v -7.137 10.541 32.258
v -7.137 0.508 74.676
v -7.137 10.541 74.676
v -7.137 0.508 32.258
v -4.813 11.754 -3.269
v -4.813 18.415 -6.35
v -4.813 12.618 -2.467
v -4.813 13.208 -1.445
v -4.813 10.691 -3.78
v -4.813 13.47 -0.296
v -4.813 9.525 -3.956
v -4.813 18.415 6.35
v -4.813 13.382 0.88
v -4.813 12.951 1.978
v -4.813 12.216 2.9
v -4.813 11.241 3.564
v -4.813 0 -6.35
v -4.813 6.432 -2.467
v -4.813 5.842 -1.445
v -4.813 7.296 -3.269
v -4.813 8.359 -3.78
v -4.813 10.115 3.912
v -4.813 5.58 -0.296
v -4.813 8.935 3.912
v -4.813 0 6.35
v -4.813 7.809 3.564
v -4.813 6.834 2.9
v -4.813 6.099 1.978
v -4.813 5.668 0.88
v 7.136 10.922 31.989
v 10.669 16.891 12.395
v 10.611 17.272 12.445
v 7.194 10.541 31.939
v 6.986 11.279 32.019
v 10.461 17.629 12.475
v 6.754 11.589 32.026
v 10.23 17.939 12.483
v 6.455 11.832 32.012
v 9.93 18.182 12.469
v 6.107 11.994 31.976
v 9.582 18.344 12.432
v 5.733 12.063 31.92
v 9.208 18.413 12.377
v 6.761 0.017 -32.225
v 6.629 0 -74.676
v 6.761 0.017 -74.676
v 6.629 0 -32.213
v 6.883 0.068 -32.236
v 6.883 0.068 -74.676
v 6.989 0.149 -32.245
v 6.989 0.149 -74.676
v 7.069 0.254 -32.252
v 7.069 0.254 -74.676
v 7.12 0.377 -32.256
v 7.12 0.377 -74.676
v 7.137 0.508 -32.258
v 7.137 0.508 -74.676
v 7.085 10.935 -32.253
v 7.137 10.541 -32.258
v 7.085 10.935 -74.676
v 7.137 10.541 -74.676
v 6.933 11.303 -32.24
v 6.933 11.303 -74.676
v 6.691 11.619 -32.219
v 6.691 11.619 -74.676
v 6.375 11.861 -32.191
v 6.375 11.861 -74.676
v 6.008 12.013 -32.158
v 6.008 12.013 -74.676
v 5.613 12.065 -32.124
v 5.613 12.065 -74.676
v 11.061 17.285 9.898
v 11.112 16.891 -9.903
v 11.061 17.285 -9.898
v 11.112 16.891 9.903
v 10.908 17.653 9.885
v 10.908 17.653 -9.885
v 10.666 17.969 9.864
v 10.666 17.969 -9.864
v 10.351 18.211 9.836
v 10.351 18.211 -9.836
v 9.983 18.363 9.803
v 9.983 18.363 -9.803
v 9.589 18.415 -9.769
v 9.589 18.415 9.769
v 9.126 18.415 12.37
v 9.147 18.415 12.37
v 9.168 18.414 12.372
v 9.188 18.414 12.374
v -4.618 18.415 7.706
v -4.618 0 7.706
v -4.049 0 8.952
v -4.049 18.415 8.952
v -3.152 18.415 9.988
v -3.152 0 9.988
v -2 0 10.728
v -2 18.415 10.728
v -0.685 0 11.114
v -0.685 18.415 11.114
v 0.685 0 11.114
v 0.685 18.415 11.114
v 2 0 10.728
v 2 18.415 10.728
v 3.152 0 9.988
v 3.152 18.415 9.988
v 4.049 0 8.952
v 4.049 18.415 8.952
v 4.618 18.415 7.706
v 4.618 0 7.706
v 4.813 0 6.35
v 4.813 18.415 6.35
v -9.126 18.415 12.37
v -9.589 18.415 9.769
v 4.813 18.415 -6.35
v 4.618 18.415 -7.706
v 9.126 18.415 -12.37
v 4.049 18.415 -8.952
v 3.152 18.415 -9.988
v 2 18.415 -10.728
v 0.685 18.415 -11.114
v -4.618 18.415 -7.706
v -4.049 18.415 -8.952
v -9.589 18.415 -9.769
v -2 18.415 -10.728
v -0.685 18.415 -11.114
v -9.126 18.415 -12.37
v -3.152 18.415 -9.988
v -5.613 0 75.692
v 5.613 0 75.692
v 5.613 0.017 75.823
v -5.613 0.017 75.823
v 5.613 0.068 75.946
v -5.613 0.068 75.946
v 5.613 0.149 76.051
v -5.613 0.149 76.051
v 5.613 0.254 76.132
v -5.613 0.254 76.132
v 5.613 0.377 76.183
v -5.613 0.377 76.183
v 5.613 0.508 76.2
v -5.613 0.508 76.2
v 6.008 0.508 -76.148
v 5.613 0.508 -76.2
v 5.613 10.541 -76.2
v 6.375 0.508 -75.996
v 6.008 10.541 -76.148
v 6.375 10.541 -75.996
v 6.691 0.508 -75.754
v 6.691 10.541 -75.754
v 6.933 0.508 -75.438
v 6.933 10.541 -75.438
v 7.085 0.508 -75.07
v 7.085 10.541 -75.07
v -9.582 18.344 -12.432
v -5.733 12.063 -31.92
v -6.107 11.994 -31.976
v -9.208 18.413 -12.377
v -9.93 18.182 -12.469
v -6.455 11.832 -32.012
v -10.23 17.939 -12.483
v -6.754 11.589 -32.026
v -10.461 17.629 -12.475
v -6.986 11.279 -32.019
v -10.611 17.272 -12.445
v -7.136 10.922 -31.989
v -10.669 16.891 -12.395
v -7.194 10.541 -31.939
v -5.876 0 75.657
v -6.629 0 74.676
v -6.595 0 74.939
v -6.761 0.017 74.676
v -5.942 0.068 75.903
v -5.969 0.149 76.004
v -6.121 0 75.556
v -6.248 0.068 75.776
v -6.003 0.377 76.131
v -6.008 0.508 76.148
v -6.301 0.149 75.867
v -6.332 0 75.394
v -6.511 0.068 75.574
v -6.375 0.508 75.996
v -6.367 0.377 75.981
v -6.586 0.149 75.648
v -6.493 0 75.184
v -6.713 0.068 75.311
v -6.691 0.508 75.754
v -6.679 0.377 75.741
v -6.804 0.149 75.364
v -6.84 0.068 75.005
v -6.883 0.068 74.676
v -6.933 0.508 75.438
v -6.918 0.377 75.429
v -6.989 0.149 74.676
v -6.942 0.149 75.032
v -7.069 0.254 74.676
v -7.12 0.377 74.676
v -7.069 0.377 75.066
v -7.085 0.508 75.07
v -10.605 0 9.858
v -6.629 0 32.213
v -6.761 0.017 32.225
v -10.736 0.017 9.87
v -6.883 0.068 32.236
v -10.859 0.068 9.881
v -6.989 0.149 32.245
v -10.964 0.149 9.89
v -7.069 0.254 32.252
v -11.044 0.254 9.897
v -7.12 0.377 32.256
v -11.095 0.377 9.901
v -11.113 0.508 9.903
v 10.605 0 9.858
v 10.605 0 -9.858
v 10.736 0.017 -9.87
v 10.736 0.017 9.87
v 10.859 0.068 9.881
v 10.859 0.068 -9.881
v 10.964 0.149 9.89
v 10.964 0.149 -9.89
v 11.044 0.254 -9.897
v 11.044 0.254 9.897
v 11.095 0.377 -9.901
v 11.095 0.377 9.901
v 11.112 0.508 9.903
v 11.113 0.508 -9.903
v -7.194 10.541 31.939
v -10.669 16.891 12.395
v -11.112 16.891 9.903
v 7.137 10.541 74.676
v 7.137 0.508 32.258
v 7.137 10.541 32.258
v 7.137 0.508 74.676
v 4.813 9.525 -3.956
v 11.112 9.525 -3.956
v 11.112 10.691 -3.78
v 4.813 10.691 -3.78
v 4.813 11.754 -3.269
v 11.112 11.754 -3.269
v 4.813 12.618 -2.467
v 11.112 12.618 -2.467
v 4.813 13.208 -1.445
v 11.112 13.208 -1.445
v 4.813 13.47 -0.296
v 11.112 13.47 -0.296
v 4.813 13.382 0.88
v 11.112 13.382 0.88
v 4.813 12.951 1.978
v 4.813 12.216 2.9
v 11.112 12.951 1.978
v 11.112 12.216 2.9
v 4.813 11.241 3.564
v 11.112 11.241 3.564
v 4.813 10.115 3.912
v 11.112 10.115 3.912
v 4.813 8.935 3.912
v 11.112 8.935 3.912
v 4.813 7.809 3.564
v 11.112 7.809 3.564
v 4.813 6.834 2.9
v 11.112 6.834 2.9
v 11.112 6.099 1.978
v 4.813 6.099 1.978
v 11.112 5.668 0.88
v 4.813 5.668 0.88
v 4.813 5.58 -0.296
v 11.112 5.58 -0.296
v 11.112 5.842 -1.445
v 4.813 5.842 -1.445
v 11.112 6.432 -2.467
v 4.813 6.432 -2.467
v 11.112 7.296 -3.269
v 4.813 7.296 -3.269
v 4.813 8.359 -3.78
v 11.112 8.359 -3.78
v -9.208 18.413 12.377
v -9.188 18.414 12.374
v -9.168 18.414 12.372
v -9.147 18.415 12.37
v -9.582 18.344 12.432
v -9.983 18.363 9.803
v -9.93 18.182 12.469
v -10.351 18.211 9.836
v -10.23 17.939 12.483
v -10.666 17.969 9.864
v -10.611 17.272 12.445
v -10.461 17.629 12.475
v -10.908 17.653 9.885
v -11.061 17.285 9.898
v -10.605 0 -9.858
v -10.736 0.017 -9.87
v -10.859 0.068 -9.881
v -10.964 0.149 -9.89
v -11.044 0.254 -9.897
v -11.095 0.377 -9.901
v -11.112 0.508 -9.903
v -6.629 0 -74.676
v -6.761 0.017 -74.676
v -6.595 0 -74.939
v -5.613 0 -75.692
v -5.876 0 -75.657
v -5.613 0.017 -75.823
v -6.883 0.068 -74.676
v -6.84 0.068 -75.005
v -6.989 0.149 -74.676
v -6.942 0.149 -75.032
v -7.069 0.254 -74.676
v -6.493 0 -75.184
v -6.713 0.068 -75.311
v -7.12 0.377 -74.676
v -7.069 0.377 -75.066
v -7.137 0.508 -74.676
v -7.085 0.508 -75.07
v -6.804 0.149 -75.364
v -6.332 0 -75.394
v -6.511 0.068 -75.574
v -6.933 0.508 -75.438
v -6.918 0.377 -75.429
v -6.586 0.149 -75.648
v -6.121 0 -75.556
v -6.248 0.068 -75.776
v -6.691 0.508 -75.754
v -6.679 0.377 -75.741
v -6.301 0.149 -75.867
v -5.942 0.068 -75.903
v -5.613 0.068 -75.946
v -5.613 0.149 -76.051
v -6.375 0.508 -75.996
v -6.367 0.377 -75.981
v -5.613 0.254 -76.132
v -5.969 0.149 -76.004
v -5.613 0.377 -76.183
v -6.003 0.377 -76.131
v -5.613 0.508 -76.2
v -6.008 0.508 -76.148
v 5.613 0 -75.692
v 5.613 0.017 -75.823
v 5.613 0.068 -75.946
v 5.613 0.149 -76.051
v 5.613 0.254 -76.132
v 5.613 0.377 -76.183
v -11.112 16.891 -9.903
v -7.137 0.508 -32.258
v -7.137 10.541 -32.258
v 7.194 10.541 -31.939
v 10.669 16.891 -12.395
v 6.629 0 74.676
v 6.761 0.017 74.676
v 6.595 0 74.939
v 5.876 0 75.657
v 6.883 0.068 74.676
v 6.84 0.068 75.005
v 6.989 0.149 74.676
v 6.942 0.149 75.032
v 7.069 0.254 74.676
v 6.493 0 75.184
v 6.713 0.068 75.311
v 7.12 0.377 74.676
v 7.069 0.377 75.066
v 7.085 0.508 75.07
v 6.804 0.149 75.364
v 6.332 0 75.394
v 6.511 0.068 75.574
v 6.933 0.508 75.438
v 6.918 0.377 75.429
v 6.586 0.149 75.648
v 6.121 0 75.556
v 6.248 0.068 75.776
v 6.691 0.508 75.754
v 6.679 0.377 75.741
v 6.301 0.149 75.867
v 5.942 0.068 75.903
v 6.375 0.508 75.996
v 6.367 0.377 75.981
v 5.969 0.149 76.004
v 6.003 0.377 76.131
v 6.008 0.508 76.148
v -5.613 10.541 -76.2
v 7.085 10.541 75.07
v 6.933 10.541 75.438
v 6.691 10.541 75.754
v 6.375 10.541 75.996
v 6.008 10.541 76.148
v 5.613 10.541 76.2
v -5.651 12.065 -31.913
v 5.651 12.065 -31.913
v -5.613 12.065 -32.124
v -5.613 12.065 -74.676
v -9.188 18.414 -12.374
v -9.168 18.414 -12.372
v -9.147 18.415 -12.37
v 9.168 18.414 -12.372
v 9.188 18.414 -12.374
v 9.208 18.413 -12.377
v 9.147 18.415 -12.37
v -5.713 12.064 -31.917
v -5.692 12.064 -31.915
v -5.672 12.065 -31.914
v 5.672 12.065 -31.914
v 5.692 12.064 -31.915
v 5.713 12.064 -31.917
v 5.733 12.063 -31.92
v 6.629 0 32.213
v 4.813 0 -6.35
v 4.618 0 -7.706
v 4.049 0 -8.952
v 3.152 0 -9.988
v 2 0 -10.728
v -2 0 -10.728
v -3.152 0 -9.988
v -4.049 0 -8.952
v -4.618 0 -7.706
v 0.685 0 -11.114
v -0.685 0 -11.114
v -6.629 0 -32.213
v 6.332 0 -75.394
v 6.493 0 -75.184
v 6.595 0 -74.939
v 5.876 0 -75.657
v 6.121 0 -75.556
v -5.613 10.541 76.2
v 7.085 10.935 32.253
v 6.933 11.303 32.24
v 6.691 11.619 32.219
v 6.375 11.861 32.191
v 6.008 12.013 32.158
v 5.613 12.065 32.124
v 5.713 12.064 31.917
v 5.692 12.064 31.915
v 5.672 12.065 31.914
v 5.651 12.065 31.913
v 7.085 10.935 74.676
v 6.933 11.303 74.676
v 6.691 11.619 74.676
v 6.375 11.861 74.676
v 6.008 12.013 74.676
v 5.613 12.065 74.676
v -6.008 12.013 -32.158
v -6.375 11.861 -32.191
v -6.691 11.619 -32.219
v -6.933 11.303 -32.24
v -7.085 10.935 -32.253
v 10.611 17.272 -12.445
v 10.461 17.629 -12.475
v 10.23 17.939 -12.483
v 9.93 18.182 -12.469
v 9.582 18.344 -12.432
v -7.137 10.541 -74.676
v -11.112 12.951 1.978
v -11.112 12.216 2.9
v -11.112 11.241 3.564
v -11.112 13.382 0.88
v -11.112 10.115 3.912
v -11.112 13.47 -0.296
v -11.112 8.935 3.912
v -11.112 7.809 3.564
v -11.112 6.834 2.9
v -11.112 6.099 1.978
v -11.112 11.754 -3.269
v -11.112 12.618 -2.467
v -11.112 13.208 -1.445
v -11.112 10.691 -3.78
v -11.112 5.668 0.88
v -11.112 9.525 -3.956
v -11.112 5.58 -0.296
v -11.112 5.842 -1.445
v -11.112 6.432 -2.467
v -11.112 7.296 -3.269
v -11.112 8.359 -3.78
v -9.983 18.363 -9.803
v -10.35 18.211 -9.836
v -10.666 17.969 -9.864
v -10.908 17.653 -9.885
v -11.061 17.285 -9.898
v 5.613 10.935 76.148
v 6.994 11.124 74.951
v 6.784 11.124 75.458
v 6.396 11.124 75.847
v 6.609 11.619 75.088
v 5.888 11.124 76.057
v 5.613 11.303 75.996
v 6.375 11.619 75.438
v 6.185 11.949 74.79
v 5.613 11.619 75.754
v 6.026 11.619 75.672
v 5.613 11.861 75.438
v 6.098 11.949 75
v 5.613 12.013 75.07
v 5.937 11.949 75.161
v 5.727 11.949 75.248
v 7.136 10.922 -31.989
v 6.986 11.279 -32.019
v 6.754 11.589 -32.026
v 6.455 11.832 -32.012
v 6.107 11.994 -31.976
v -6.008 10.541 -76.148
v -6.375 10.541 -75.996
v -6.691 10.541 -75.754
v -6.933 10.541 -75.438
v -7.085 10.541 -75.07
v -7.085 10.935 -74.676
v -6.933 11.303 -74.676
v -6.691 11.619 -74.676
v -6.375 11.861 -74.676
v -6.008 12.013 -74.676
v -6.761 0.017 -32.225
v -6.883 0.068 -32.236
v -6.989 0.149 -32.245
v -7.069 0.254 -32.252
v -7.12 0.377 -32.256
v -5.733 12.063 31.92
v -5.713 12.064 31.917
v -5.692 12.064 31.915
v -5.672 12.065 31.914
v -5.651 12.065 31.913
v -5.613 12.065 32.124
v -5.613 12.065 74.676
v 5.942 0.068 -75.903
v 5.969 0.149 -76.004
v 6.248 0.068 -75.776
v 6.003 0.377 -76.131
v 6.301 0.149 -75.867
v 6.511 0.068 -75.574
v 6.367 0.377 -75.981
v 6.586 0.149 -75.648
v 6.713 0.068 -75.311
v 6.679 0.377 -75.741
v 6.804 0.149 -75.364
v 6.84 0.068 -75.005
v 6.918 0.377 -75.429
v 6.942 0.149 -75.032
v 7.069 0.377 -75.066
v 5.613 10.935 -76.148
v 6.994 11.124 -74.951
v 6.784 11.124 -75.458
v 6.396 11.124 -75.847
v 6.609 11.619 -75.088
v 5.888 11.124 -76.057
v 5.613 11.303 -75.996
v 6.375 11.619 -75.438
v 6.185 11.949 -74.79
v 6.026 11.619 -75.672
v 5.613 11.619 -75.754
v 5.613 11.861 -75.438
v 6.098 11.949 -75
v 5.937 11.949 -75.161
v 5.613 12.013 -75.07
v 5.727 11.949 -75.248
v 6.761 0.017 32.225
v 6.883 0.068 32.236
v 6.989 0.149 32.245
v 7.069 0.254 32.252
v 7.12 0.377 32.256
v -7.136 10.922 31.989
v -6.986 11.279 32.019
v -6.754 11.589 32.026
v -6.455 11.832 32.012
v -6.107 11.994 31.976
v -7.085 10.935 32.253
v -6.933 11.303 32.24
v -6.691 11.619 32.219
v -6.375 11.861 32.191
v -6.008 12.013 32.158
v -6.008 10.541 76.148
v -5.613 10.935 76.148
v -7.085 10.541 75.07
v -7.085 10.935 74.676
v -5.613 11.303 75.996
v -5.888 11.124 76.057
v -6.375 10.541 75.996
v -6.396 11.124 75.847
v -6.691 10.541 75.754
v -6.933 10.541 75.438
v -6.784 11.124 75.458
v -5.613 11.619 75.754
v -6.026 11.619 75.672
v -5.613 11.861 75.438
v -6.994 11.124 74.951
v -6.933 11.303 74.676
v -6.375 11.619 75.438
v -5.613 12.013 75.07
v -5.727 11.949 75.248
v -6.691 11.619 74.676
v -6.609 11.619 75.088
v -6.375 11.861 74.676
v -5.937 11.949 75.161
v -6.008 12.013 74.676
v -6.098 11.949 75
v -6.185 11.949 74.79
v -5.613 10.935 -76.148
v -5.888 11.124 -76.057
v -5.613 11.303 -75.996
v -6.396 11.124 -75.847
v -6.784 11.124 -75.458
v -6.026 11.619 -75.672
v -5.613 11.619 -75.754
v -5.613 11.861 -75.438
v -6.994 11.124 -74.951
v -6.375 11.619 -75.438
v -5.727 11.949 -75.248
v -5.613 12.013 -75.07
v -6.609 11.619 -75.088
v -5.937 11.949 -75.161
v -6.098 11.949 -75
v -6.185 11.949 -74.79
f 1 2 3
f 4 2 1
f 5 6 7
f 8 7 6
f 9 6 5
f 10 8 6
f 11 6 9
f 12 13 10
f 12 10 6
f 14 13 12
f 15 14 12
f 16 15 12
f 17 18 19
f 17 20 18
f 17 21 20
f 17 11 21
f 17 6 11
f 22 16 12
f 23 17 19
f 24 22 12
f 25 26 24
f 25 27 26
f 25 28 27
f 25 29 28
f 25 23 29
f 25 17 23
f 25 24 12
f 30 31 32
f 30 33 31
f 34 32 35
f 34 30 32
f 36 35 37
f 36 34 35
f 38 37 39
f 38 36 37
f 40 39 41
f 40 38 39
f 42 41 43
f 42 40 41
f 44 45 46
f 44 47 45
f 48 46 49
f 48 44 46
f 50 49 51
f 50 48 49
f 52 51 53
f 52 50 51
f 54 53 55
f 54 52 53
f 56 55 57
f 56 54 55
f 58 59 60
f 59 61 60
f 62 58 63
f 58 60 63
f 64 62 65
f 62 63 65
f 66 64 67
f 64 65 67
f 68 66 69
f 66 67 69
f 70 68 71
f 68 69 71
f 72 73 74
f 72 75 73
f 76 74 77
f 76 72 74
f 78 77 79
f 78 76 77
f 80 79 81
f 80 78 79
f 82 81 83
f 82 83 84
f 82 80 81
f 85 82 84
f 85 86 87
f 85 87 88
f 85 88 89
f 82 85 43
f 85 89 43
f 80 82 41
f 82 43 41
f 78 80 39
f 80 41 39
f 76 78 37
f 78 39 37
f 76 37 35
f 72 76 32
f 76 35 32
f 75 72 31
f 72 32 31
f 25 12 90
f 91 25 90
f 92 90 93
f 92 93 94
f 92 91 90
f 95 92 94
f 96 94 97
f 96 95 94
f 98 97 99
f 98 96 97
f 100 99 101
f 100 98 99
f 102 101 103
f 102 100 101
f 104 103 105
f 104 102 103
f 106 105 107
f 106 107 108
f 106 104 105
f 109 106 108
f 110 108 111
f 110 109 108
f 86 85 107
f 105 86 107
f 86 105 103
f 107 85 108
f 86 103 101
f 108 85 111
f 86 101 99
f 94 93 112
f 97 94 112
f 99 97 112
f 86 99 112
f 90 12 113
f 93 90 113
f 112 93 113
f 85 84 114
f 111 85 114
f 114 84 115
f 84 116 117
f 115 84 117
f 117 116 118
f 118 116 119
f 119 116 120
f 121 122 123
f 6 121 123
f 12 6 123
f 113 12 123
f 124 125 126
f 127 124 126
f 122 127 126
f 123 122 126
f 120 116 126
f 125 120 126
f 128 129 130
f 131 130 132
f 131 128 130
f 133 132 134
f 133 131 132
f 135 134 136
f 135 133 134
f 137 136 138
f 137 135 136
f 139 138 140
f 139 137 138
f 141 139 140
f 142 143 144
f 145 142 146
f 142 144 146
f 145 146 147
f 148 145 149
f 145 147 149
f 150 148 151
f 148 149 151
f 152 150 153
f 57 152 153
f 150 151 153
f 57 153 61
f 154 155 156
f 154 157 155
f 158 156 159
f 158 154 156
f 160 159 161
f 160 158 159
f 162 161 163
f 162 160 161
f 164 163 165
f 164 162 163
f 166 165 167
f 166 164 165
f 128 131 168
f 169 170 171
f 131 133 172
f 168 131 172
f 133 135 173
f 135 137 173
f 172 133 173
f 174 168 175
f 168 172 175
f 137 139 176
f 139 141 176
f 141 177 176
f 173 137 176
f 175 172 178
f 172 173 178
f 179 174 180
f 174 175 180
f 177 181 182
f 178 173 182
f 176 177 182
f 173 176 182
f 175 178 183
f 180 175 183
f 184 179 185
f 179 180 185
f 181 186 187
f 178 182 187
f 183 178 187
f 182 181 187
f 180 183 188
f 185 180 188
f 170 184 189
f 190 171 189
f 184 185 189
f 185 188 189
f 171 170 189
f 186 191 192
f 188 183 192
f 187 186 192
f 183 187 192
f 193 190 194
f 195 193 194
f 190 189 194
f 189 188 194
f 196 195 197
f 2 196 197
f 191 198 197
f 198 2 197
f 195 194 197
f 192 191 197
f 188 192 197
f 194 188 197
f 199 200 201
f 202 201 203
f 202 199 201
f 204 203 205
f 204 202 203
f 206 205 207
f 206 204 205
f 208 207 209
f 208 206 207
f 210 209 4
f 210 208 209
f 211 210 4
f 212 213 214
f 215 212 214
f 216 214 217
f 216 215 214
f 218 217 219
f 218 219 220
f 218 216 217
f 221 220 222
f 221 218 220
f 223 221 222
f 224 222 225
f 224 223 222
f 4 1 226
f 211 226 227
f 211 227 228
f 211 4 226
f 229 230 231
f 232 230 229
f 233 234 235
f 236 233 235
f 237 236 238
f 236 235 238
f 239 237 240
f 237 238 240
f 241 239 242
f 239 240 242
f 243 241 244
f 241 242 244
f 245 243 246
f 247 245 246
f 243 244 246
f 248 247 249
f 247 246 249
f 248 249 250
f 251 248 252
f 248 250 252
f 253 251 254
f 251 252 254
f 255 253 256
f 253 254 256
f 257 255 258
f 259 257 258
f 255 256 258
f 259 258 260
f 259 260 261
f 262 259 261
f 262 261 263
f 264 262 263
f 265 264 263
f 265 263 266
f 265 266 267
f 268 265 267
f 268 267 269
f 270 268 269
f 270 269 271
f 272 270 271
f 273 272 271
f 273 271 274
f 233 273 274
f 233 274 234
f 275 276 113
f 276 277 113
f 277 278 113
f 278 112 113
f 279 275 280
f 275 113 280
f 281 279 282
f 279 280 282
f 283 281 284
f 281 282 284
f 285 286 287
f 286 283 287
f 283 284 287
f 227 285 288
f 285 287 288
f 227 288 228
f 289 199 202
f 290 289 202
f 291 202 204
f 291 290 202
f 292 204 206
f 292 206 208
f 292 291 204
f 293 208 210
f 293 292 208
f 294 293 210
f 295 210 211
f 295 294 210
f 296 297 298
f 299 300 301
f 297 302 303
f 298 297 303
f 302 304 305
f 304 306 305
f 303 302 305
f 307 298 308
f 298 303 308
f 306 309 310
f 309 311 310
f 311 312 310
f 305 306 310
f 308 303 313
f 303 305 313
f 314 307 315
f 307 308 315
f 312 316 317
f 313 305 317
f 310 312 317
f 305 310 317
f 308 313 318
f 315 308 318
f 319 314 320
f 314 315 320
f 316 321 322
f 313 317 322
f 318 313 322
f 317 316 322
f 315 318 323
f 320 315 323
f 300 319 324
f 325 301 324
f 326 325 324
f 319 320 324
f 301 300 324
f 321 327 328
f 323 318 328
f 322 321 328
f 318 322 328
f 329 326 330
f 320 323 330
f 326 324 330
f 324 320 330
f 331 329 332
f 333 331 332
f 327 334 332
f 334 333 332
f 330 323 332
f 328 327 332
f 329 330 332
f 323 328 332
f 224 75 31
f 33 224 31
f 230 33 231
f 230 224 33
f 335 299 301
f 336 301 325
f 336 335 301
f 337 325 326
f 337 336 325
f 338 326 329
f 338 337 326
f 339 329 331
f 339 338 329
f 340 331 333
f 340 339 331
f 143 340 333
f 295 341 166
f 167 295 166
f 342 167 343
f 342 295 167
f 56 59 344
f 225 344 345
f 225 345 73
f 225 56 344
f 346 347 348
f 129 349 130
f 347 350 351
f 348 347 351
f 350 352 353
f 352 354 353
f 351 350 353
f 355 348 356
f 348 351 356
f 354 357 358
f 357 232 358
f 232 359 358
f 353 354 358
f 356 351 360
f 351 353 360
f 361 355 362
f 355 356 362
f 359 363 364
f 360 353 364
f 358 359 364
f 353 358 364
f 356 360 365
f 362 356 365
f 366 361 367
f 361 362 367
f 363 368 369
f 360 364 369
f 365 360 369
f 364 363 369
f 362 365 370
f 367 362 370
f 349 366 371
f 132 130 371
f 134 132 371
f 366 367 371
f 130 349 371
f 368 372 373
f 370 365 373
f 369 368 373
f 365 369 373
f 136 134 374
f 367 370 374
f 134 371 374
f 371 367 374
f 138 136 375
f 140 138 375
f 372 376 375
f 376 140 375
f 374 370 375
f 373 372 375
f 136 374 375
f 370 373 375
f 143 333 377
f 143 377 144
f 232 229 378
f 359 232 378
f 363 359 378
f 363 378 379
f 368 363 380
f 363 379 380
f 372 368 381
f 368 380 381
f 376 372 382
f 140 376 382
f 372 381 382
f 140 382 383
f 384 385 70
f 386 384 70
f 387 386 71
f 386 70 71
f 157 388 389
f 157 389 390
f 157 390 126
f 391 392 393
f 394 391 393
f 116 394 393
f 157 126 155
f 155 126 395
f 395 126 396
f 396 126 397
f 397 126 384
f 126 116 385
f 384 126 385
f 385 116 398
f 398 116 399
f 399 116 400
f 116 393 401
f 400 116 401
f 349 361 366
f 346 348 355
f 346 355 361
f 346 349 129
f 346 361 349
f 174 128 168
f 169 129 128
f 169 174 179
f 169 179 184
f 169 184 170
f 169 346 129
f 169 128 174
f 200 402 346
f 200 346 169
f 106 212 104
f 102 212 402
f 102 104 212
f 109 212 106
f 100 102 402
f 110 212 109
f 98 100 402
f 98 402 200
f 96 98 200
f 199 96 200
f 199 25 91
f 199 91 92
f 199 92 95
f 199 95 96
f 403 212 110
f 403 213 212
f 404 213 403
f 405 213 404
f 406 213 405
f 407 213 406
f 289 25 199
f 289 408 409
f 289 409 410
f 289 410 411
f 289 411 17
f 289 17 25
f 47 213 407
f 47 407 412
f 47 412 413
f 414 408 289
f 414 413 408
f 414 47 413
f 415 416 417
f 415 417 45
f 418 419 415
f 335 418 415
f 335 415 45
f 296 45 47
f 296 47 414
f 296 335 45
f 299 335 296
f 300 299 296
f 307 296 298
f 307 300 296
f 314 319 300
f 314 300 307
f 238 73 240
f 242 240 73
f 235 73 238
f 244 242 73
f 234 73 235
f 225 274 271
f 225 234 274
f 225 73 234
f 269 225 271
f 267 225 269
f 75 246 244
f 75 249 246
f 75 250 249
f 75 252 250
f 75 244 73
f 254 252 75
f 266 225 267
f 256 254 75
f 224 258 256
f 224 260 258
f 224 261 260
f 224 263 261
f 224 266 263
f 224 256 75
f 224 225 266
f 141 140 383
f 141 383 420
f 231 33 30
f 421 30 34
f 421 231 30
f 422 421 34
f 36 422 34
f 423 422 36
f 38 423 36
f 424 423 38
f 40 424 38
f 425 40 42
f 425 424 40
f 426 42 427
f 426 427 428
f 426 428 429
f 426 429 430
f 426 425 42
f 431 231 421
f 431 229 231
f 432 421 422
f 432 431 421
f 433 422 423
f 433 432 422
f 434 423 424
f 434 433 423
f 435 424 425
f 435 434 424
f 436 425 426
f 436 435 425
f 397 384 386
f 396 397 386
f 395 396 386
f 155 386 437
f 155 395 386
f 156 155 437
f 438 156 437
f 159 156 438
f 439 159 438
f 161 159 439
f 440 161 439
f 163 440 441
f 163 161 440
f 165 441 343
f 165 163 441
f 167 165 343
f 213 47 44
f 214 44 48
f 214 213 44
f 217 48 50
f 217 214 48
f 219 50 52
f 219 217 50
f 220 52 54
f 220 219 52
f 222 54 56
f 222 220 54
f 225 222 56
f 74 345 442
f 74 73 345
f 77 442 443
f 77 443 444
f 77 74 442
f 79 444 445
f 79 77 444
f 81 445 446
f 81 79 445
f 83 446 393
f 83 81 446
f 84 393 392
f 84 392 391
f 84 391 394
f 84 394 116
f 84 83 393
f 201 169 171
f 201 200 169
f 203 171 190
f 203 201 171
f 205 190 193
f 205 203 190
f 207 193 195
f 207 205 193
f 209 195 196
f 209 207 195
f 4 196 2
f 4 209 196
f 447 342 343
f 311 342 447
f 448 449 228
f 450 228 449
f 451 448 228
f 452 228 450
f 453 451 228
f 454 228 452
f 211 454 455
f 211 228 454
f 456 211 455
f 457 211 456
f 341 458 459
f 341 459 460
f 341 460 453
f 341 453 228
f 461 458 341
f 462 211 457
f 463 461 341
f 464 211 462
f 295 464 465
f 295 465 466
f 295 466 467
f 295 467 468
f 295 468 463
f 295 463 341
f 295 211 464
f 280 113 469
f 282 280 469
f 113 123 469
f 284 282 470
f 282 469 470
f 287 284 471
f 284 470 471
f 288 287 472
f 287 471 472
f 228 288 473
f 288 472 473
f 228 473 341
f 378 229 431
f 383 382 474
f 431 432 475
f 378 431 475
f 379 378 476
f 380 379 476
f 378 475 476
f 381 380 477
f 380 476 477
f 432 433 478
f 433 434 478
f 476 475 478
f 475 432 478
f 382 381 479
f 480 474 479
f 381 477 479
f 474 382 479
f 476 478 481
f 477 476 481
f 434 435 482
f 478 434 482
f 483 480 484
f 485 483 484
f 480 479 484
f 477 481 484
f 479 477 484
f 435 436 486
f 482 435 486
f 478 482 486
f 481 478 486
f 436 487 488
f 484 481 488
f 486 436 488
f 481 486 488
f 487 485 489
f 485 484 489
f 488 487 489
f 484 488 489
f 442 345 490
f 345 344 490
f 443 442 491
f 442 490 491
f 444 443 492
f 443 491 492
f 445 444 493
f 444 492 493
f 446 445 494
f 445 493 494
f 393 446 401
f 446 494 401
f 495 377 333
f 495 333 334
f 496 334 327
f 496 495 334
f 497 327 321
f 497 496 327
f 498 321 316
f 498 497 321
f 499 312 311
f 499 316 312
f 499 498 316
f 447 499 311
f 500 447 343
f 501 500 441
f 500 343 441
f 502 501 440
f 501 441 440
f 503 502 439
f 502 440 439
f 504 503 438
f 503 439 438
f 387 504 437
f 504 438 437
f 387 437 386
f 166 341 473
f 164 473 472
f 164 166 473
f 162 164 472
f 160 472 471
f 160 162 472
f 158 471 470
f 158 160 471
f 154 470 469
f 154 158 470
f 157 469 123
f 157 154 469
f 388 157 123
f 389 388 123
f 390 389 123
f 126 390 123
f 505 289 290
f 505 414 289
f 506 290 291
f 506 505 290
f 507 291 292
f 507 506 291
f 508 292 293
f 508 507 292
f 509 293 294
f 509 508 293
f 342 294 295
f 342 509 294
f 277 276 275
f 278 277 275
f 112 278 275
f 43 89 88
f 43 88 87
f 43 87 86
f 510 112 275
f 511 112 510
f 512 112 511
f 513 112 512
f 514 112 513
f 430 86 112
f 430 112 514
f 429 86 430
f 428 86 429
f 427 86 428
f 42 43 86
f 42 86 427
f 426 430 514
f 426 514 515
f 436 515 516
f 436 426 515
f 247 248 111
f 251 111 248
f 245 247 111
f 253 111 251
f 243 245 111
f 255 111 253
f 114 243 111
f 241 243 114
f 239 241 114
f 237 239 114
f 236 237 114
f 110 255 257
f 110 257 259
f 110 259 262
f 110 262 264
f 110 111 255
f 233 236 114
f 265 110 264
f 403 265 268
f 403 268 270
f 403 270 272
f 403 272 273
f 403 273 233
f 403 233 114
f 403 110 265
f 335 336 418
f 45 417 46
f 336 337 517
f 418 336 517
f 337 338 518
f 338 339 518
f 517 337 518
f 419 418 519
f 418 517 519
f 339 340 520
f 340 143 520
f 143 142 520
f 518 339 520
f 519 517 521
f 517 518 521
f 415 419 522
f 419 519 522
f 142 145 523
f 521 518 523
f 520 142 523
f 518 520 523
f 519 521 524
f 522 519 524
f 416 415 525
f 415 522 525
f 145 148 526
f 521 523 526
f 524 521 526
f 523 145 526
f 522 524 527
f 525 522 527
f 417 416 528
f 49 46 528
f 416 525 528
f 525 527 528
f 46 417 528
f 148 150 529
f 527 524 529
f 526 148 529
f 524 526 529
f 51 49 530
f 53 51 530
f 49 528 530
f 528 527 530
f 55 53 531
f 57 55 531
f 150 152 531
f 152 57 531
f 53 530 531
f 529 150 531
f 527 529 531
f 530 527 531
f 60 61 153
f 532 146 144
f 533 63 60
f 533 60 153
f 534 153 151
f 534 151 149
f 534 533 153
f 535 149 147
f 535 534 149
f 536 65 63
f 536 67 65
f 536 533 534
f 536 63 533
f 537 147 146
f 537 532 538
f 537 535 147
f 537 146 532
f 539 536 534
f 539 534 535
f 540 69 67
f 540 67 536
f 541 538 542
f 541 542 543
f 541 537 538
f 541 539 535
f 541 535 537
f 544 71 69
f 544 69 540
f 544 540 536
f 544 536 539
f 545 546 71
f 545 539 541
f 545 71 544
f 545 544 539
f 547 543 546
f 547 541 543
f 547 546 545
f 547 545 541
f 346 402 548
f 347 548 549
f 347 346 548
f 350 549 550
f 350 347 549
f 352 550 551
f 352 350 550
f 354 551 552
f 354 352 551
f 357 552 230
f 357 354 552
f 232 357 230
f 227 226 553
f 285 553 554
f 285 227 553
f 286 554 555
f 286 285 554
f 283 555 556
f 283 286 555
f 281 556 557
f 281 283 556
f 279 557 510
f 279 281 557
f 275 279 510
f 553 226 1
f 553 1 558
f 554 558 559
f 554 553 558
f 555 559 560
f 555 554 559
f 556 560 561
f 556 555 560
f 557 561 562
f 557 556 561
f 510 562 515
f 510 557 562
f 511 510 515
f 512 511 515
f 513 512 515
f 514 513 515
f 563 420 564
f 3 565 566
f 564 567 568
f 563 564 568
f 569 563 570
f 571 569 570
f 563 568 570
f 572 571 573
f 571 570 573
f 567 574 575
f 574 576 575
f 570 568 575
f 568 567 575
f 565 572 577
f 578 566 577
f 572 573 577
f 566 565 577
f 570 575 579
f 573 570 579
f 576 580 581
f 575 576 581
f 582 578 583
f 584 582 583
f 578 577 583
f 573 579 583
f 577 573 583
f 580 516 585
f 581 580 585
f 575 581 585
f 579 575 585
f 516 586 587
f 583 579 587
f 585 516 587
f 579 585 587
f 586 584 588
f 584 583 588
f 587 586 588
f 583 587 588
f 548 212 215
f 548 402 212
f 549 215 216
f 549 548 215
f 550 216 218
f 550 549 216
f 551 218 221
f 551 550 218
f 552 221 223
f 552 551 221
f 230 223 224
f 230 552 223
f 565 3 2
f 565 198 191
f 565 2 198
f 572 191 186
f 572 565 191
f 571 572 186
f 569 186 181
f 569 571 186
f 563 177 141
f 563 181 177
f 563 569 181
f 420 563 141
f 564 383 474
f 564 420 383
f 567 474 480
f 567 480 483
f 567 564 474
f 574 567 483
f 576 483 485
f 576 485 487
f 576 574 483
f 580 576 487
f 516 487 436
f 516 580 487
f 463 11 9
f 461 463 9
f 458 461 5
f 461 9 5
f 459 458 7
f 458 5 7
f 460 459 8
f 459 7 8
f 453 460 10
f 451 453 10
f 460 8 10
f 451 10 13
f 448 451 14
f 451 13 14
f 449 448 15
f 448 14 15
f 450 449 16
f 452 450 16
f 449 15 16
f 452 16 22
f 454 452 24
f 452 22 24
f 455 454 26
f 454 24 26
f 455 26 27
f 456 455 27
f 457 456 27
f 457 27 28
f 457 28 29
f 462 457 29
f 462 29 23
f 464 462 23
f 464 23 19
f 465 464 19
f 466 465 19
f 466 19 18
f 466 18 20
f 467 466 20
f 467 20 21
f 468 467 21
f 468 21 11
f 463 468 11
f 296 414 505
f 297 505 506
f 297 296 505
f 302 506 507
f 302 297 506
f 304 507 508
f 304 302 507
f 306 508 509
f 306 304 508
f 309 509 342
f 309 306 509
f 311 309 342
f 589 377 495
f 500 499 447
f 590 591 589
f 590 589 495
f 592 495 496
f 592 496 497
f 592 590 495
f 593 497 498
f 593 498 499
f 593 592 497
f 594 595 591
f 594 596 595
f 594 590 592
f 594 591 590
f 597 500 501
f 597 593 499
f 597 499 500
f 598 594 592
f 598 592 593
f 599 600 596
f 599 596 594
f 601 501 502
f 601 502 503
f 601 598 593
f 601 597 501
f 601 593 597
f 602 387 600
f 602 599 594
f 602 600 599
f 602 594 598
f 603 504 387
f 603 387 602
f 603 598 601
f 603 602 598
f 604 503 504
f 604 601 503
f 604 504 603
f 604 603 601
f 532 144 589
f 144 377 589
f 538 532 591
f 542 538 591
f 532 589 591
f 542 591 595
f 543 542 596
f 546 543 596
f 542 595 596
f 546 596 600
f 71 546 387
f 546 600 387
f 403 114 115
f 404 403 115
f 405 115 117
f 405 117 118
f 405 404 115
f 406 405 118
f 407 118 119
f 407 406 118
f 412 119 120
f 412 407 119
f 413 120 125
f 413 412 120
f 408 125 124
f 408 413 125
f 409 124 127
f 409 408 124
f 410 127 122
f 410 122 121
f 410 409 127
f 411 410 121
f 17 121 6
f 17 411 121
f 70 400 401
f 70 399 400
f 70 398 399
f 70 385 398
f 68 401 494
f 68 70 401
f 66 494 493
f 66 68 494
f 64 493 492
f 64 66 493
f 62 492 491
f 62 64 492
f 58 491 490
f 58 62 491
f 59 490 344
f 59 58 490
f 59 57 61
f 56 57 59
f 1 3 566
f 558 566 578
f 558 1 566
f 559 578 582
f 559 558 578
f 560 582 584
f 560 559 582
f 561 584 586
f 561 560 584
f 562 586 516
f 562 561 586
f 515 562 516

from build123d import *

# Parameters (mm, degrees)
EXTRUDE1_DEPTH     = 18.415
CUT_EXTRUDE1_DEPTH = 23.225
SKETCH3_R          = 3.95605
CUT_EXTRUDE2_DEPTH = 23.225
FILLET1_R          = 1.524
FILLET2_R          = 0.508
FILLET3_R          = 1.524


with BuildPart() as part:
    # Sketch1 → Extrude1 (new body)
    with BuildSketch(Plane(origin=(0, 0, 0), x_dir=(1, 0, 0), z_dir=(0, 1, 0))):
        Polygon((-7.1374, 76.2), (7.1374, 76.2), (7.1374, 32.258), (11.1125, 9.902952), (11.1125, -9.902952), (7.1374, -32.258), (7.1374, -76.2), (-7.1374, -76.2), (-7.1374, -32.258), (-11.1125, -9.902952), (-11.1125, 9.902952), (-7.1374, 32.258), align=None)
        with BuildLine():
            Line((-4.8133, 6.35), (-4.8133, -6.35))
            ThreePointArc((-4.8133, -6.35), (0, -11.1633), (4.8133, -6.35))
            Line((4.8133, -6.35), (4.8133, 6.35))
            ThreePointArc((4.8133, 6.35), (0, 11.1633), (-4.8133, 6.35))
        make_face(mode=Mode.SUBTRACT)
    extrude(amount=EXTRUDE1_DEPTH)

    # Sketch2 → Cut-Extrude1 (cut, through all)
    with BuildSketch(Plane(origin=(11.1125, 0, 0), x_dir=(0, 0, -1), z_dir=(1, 0, 0))):
        Polygon((76.2, 18.415), (12.3698, 18.415), (31.913090461, 12.065), (76.2, 12.065), align=None)
        Polygon((-76.2, 12.065), (-76.2, 18.415), (-12.3698, 18.415), (-31.913090461, 12.065), align=None)
    extrude(amount=-CUT_EXTRUDE1_DEPTH, mode=Mode.SUBTRACT)

    # Sketch3 → Cut-Extrude2 (cut, through all)
    with BuildSketch(Plane(origin=(11.1125, 0, 0), x_dir=(0, 0, -1), z_dir=(1, 0, 0))):
        with Locations((0, 9.525)):
            Circle(SKETCH3_R)
    extrude(amount=-CUT_EXTRUDE2_DEPTH, mode=Mode.SUBTRACT)

    # Fillet1
    fillet1_edges = [part.edges().sort_by_distance(p)[0] for p in [
        (-7.1374, 6.0325, -76.2),
        (7.1374, 6.0325, -76.2),
        (7.1374, 6.0325, 76.2),
        (-7.1374, 6.0325, 76.2),
    ]]
    fillet(fillet1_edges, radius=FILLET1_R)

    # Fillet2
    fillet2_edges = [part.edges().sort_by_distance(p)[0] for p in [
        (-7.1374, 0, -53.467),
        (7.1374, 0, 53.467),
        (0, 0, 76.2),
        (0, 0, -76.2),
        (-6.691030735, 0, 75.753630735),
        (9.12495, 0, -21.080476),
        (6.691030735, 0, 75.753630735),
        (6.691030735, 0, -75.753630735),
        (-6.691030735, 0, -75.753630735),
        (11.1125, 0, 0),
        (9.12495, 0, 21.080476),
        (-7.1374, 0, 53.467),
        (-9.12495, 0, 21.080476),
        (-11.1125, 0, 0),
        (-9.12495, 0, -21.080476),
        (7.1374, 0, -53.467),
    ]]
    fillet(fillet2_edges, radius=FILLET2_R)

    # Fillet3
    fillet3_edges = [part.edges().sort_by_distance(p)[0] for p in [
        (0, 12.065, -76.2),
        (7.1374, 12.065, -53.467),
        (6.691030735, 12.065, -75.753630735),
        (-6.691030735, 12.065, -75.753630735),
        (0, 12.065, 76.2),
        (-7.1374, 12.065, 53.467),
        (-6.691030735, 12.065, 75.753630735),
        (6.691030735, 12.065, 75.753630735),
        (-11.1125, 18.415, 0),
        (-10.893176662, 18.415, 11.136376),
        (11.1125, 18.415, 0),
        (10.893176662, 18.415, -11.136376),
        (8.936291994, 15.24, -22.141445231),
        (7.168065331, 12.065, -32.085545231),
        (-10.893176662, 18.415, -11.136376),
        (-7.168065331, 12.065, -32.085545231),
        (-7.1374, 12.065, -53.467),
        (-8.936291994, 15.24, -22.141445231),
        (10.893176662, 18.415, 11.136376),
        (8.936291994, 15.24, 22.141445231),
        (7.168065331, 12.065, 32.085545231),
        (-7.168065331, 12.065, 32.085545231),
        (7.1374, 12.065, 53.467),
        (-8.936291994, 15.24, 22.141445231),
    ]]
    fillet(fillet3_edges, radius=FILLET3_R)


solid = part.part
